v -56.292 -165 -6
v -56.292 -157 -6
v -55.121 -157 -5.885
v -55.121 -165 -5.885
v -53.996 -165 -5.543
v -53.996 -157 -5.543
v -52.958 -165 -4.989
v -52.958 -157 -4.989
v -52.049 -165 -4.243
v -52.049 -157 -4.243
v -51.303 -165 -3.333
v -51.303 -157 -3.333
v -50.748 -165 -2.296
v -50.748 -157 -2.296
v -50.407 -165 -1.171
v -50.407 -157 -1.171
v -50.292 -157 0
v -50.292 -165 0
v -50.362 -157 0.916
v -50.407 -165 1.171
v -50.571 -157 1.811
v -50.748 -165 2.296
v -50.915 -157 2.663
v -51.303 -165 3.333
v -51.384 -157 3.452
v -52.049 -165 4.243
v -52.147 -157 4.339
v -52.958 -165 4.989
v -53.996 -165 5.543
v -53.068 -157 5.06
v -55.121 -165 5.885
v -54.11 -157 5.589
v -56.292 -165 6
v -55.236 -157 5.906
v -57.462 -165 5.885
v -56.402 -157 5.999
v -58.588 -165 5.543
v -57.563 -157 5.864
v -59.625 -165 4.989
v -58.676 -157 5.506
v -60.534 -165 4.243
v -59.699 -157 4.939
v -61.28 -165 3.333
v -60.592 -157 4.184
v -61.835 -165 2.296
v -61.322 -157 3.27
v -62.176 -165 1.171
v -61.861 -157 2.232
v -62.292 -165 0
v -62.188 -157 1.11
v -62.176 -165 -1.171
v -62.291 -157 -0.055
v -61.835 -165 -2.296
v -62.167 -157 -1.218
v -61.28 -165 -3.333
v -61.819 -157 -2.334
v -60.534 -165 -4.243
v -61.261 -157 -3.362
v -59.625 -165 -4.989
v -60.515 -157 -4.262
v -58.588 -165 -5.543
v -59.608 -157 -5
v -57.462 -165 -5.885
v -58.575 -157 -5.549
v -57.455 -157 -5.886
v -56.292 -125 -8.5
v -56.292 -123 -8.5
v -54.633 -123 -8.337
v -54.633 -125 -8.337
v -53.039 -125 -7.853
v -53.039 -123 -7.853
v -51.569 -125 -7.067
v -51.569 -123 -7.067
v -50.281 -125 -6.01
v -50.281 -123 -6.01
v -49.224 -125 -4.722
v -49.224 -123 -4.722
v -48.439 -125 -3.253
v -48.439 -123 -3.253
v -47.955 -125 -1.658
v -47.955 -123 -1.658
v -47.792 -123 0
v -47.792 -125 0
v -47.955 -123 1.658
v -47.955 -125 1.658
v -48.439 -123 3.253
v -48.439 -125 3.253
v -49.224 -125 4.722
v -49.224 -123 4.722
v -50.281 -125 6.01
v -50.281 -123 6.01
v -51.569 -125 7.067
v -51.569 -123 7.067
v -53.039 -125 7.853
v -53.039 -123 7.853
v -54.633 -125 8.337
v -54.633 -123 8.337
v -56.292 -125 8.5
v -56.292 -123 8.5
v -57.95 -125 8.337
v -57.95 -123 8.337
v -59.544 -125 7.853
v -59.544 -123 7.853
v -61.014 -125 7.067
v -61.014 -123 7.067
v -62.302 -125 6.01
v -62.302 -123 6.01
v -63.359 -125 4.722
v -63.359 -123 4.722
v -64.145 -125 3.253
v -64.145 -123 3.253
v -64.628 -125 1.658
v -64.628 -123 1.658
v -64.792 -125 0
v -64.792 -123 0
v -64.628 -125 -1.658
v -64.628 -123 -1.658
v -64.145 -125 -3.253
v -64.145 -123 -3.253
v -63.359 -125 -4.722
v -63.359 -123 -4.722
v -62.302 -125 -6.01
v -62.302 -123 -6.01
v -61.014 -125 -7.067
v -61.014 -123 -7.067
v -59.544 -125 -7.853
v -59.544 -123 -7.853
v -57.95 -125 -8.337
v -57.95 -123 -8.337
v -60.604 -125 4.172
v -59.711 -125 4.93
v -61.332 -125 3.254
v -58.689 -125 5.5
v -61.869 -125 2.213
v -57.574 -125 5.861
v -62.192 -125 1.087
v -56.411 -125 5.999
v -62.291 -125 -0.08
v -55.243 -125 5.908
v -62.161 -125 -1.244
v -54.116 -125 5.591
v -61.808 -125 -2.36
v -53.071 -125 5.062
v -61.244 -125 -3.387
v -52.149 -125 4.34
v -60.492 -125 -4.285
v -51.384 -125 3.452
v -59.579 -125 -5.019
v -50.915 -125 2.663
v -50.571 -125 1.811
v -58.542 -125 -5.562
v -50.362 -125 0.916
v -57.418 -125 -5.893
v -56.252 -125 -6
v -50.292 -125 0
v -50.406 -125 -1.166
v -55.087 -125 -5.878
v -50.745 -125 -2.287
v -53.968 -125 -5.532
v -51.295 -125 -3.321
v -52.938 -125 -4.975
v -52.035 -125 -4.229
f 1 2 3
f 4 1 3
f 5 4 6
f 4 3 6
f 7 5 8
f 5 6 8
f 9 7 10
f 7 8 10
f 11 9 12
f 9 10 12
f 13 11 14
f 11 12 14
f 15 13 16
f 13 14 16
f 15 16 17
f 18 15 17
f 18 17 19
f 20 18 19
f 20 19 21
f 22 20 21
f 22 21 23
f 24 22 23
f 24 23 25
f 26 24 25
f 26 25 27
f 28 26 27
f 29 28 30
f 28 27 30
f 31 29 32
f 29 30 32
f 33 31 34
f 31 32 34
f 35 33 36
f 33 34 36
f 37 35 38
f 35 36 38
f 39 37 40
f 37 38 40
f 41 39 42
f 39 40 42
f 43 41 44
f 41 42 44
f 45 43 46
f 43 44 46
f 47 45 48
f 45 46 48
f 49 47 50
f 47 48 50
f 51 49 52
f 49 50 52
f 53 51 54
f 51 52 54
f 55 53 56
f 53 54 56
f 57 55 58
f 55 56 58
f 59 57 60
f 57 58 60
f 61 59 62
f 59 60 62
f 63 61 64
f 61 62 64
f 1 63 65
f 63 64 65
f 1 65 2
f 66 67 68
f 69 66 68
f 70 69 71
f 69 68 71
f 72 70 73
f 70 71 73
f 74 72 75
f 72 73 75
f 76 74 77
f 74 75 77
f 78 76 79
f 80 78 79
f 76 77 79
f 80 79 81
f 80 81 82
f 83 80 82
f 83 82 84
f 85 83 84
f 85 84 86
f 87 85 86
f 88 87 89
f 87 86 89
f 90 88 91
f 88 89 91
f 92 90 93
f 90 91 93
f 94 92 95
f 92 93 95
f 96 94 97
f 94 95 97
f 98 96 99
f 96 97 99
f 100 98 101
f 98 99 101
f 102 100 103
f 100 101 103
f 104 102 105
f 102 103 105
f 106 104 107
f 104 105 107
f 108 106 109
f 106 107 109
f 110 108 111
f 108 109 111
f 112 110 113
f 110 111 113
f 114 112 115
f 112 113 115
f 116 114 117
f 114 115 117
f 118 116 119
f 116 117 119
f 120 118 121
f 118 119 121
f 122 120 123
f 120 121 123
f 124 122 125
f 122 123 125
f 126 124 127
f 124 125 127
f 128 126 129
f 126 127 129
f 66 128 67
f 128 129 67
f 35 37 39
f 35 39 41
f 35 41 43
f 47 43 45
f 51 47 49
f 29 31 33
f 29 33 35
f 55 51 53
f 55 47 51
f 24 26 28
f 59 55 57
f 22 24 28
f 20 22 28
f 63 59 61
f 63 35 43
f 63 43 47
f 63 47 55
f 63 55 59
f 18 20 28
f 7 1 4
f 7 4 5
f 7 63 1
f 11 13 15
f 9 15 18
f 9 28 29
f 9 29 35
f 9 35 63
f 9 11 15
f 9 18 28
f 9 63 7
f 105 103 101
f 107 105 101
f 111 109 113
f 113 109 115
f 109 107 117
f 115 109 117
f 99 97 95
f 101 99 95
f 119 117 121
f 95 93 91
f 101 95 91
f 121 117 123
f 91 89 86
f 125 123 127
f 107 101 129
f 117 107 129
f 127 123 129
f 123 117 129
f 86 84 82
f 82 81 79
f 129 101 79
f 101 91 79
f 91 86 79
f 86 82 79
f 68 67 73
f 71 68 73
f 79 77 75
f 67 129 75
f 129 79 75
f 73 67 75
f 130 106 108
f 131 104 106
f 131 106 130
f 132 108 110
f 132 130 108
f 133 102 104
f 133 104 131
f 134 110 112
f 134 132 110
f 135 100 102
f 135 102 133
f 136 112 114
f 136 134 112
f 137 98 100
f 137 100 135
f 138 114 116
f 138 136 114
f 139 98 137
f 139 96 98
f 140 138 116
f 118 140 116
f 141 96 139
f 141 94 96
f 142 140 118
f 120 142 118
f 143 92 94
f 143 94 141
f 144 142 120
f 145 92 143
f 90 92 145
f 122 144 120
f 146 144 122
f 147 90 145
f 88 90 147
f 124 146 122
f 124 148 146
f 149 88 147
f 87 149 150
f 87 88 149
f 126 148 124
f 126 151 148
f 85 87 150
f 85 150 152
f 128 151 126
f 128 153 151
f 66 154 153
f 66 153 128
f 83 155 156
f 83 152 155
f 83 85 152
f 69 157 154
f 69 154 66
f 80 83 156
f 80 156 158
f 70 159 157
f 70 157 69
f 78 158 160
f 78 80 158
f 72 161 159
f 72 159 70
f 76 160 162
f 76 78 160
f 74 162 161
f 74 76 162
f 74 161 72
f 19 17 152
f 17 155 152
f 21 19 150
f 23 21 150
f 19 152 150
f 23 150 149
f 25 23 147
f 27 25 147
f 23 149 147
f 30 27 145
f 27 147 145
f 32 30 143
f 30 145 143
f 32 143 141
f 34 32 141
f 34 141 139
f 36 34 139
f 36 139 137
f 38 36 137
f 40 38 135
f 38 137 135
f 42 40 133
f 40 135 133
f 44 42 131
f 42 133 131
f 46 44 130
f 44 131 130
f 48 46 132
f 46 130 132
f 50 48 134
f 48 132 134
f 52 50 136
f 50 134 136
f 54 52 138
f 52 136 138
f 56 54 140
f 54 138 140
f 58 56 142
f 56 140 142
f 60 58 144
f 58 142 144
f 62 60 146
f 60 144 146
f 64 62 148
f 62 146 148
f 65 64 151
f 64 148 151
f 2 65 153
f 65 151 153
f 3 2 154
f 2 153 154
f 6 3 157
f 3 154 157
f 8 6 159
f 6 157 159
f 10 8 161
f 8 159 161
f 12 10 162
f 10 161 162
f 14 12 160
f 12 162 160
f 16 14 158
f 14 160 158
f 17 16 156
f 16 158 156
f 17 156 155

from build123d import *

# Parameters (mm, degrees)
MAIN_PROFILE_SKETCH_R     = 8.5
MAIN_EXTRUSION_DEPTH      = 2
DETAIL_EXTRUSION_2_DEPTH  = 31.5
DETAIL_EXTRUSION_3_DEPTH  = 0.5
DETAIL_PROFILE_4_SKETCH_R = 6
DETAIL_EXTRUSION_4_DEPTH  = 8


with BuildPart() as part:
    # Main Profile Sketch → Main Extrusion (new body)
    with BuildSketch(Plane(origin=(0, -123, 0), x_dir=(-1, 0, 0), z_dir=(0, -1, 0))):
        with Locations(Location((56.291651246, 0, 0), (0, 0, 90))):
            Circle(MAIN_PROFILE_SKETCH_R)
    extrude(amount=MAIN_EXTRUSION_DEPTH)

    # Detail Profile 2 Sketch → Detail Extrusion 2 (add)
    with BuildSketch(Plane(origin=(0, -125, 0), x_dir=(-1, 0, 0), z_dir=(0, -1, 0))):
        with BuildLine():
            ThreePointArc((51.384442087, -3.452433674), (62.011933361, 1.81062766), (50.291651246, 0))
            ThreePointArc((50.291651246, 0), (50.571369131, -1.81062766), (51.384442087, -3.452433674))
        make_face()
    extrude(amount=DETAIL_EXTRUSION_2_DEPTH)

    # Detail Profile 3 Sketch → Detail Extrusion 3 (add)
    with BuildSketch(Plane(origin=(0, -156.5, 0), x_dir=(-1, 0, 0), z_dir=(0, -1, 0))):
        with BuildLine():
            ThreePointArc((51.384442087, -3.452433674), (62.011933361, 1.81062766), (50.291651246, 0))
            ThreePointArc((50.291651246, 0), (50.571369131, -1.81062766), (51.384442087, -3.452433674))
        make_face()
    extrude(amount=DETAIL_EXTRUSION_3_DEPTH)

    # Detail Profile 4 Sketch → Detail Extrusion 4 (add)
    with BuildSketch(Plane(origin=(0, -157, 0), x_dir=(-1, 0, 0), z_dir=(0, -1, 0))):
        with Locations(Location((56.291651246, 0, 0), (0, 0, 90))):
            Circle(DETAIL_PROFILE_4_SKETCH_R)
    extrude(amount=DETAIL_EXTRUSION_4_DEPTH)


solid = part.part
